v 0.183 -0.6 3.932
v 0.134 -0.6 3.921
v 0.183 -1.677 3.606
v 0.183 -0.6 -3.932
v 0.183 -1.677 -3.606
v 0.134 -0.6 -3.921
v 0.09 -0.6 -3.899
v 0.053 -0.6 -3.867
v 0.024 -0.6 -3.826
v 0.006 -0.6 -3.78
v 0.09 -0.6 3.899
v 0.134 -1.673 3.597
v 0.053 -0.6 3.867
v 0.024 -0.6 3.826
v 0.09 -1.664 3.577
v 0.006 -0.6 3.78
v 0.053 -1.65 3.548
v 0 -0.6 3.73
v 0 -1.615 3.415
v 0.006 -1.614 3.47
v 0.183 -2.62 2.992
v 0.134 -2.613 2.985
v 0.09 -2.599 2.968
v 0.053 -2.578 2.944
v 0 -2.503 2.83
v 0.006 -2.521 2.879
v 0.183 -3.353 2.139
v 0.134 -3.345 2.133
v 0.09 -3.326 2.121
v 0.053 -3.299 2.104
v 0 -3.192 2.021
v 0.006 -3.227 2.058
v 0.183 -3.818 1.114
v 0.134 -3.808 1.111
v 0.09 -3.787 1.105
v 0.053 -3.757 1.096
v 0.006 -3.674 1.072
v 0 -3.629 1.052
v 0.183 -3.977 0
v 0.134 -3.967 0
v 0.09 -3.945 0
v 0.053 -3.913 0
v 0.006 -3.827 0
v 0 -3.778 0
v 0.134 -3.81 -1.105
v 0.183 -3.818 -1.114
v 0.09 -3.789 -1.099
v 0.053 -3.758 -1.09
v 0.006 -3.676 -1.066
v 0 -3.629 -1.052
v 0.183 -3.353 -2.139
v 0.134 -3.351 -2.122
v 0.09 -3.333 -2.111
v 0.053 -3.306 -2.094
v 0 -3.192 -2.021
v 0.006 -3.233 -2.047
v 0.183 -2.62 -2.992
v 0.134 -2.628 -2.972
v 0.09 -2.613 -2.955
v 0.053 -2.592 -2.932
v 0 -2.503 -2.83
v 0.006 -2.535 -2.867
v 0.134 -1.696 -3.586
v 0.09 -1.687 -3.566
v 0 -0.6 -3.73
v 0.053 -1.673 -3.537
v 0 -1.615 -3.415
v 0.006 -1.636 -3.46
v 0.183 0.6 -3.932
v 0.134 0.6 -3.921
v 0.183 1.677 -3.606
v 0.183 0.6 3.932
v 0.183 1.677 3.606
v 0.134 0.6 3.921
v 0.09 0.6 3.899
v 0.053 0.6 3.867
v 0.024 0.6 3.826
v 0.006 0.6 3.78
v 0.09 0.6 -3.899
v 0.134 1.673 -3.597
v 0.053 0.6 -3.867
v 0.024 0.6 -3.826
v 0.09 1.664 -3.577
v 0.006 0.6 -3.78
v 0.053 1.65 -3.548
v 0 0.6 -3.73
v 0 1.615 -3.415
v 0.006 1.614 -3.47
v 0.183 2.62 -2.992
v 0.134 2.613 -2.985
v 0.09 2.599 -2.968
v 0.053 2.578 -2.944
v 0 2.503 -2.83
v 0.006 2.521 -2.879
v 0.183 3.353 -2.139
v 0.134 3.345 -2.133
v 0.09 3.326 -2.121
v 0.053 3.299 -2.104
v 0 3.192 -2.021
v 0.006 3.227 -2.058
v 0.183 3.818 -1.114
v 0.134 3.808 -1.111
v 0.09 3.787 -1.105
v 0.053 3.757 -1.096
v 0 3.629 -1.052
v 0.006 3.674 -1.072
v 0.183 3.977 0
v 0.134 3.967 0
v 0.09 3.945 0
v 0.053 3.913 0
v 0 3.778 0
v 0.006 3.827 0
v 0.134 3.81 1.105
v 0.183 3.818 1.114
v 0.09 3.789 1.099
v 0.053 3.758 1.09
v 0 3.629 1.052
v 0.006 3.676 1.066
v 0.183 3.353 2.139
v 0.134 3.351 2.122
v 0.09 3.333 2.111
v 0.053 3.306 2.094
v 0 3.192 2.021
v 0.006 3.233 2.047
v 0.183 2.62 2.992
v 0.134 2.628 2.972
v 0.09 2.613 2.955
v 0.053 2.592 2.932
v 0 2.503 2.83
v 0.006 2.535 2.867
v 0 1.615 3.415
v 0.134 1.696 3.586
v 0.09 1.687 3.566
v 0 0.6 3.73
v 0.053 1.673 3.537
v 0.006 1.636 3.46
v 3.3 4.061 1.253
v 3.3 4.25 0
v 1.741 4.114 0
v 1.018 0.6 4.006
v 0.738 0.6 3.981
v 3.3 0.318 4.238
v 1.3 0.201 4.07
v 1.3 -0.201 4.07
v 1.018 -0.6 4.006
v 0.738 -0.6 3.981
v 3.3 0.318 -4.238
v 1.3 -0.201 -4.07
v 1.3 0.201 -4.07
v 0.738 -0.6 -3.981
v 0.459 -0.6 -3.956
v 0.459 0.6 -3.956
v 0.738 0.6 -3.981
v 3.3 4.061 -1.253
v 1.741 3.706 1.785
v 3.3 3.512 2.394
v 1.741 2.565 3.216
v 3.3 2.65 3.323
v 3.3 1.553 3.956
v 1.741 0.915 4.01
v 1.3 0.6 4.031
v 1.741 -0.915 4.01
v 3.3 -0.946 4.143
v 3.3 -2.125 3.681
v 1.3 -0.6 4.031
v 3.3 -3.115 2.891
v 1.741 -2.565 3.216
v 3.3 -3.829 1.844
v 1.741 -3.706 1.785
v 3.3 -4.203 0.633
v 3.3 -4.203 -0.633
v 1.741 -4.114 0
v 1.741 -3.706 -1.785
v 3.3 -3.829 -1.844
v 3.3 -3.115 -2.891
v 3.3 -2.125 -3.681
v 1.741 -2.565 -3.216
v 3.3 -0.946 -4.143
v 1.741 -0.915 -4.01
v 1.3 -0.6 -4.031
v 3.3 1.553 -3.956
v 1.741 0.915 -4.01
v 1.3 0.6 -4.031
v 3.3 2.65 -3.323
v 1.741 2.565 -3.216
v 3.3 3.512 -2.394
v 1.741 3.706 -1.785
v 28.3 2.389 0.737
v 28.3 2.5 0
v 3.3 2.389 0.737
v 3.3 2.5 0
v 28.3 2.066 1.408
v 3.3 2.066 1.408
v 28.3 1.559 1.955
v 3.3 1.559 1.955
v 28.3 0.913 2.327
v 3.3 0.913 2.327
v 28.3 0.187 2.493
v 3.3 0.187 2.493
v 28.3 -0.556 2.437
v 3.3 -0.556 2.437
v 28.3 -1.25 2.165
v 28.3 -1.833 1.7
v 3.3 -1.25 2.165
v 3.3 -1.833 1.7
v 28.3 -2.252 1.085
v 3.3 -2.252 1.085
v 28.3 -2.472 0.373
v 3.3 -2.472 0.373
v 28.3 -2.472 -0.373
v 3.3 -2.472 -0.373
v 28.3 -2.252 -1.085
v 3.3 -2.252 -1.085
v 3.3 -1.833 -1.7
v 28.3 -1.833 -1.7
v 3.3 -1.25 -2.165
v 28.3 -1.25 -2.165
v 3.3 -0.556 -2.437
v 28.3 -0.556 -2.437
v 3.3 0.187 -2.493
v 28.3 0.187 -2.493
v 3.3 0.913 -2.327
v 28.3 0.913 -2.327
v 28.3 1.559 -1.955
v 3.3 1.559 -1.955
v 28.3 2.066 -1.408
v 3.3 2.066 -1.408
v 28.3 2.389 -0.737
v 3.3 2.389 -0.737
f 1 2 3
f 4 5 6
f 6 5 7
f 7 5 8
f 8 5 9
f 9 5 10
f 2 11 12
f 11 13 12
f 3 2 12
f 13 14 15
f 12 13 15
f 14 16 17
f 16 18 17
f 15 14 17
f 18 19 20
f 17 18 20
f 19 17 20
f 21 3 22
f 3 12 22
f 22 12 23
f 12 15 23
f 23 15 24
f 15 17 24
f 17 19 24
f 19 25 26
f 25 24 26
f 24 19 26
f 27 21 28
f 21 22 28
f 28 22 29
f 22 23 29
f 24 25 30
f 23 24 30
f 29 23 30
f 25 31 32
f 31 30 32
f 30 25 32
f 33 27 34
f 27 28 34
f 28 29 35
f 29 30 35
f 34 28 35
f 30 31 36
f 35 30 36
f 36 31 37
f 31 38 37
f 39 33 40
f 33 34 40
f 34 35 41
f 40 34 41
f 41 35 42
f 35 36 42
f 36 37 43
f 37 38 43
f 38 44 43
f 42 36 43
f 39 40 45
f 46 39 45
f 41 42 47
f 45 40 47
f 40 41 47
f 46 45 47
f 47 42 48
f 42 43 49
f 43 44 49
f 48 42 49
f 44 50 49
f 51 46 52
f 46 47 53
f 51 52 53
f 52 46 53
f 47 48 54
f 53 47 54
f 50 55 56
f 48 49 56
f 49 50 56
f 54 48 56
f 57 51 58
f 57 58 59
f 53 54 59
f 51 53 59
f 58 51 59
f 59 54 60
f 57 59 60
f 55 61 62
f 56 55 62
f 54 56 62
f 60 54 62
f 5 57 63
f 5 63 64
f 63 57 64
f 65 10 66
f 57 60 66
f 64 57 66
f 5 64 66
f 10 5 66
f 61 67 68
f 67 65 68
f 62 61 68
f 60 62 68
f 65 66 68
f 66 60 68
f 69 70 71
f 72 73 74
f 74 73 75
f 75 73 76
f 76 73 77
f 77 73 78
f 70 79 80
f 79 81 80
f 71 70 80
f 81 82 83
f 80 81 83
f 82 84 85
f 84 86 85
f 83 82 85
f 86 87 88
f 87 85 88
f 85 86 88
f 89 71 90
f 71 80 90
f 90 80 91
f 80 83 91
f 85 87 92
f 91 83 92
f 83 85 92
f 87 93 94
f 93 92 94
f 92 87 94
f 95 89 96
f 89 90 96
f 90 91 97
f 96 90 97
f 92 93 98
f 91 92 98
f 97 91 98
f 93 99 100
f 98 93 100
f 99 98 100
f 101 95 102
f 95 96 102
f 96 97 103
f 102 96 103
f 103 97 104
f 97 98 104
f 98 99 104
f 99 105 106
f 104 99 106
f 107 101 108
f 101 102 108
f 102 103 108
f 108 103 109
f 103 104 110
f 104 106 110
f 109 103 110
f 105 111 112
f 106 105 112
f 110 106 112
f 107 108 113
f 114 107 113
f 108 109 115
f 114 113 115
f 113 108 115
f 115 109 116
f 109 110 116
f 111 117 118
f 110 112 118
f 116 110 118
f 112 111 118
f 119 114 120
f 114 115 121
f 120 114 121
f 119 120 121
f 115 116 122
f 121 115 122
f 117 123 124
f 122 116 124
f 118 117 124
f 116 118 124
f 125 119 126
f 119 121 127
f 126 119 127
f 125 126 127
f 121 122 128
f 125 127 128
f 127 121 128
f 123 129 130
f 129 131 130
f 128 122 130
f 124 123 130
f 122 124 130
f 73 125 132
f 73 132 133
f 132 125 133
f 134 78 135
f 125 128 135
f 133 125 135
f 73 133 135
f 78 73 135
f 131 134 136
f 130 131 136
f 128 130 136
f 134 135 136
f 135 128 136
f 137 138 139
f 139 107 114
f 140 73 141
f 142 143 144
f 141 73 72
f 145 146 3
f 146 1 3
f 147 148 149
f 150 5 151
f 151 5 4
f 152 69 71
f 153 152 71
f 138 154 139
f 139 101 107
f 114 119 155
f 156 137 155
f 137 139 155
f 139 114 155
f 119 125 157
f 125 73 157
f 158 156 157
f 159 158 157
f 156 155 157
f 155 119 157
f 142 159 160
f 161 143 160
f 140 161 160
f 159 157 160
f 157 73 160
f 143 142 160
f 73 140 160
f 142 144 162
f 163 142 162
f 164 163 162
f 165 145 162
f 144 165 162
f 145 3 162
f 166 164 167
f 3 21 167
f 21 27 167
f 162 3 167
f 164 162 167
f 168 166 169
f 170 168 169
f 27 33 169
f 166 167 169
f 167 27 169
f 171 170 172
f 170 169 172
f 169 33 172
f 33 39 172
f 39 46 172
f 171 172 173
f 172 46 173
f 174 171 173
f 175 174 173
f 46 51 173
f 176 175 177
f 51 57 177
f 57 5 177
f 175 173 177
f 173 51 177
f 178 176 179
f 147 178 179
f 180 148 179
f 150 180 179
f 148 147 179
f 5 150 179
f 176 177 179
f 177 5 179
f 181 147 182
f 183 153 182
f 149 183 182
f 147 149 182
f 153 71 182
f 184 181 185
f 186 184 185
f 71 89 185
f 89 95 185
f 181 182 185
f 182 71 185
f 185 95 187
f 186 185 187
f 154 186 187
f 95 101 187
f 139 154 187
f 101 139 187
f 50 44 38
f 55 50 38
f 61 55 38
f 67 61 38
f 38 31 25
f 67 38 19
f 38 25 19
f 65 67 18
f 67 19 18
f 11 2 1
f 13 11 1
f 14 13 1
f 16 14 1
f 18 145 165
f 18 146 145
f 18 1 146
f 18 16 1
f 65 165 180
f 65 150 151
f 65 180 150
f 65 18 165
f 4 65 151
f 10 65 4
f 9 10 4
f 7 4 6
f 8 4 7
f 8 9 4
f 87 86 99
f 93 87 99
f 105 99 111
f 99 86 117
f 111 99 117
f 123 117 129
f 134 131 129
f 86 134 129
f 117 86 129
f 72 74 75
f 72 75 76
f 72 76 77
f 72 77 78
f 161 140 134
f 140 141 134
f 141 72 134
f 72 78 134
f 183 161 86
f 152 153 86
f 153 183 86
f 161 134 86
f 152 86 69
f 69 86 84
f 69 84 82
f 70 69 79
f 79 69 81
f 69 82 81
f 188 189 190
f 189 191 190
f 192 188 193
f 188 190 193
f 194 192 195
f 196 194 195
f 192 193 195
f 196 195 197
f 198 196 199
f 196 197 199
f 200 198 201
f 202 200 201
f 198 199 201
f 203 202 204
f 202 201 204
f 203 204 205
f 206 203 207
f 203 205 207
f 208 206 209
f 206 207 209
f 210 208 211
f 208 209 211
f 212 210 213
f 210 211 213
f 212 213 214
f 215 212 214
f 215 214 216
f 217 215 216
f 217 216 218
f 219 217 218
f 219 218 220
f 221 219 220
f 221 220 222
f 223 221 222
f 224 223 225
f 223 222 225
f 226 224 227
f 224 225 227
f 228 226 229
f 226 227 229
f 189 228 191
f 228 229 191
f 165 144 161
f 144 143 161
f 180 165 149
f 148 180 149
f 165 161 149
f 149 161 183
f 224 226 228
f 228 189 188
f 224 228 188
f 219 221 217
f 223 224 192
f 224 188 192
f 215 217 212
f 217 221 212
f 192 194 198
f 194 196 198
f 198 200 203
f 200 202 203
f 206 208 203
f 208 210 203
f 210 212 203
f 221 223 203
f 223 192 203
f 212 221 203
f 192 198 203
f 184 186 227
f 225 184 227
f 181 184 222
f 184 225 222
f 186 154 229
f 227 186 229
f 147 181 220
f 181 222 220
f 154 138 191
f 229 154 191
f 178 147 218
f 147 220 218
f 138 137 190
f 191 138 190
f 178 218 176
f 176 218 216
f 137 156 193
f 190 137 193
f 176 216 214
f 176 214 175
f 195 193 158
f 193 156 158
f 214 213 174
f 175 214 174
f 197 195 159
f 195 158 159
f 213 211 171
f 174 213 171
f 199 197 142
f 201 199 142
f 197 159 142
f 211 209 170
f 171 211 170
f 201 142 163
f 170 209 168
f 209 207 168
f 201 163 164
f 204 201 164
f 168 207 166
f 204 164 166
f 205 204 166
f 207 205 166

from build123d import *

# Parameters (mm, degrees)
FILLET2_R  = 0.2
SKETCH2_W  = 8.5
SKETCH2_H  = 1.2
SLOT_DEPTH = 1.3


with BuildPart() as part:
    # BodySke → Base-Revolve (revolve)
    with BuildSketch(Plane.XY):
        Polygon((3.3, 2.5), (3.3, 4.25), (0, 3.96128741), (0, 0), (28.3, 0), (28.3, 2.5), align=None)
    revolve(axis=Axis((-25.4, 0, 0), (1, 0, 0)))

    # Fillet2
    fillet2_edges = [part.edges().sort_by_distance(p)[0] for p in [
        (0, -3.96128741, 0),
    ]]
    fillet(fillet2_edges, radius=FILLET2_R)

    # Sketch2 → Slot (cut)
    with BuildSketch(Plane(origin=(0, 0, 0), x_dir=(0, 0, -1), z_dir=(1, 0, 0))):
        Rectangle(SKETCH2_W, SKETCH2_H)
    extrude(amount=SLOT_DEPTH, mode=Mode.SUBTRACT)


solid = part.part
